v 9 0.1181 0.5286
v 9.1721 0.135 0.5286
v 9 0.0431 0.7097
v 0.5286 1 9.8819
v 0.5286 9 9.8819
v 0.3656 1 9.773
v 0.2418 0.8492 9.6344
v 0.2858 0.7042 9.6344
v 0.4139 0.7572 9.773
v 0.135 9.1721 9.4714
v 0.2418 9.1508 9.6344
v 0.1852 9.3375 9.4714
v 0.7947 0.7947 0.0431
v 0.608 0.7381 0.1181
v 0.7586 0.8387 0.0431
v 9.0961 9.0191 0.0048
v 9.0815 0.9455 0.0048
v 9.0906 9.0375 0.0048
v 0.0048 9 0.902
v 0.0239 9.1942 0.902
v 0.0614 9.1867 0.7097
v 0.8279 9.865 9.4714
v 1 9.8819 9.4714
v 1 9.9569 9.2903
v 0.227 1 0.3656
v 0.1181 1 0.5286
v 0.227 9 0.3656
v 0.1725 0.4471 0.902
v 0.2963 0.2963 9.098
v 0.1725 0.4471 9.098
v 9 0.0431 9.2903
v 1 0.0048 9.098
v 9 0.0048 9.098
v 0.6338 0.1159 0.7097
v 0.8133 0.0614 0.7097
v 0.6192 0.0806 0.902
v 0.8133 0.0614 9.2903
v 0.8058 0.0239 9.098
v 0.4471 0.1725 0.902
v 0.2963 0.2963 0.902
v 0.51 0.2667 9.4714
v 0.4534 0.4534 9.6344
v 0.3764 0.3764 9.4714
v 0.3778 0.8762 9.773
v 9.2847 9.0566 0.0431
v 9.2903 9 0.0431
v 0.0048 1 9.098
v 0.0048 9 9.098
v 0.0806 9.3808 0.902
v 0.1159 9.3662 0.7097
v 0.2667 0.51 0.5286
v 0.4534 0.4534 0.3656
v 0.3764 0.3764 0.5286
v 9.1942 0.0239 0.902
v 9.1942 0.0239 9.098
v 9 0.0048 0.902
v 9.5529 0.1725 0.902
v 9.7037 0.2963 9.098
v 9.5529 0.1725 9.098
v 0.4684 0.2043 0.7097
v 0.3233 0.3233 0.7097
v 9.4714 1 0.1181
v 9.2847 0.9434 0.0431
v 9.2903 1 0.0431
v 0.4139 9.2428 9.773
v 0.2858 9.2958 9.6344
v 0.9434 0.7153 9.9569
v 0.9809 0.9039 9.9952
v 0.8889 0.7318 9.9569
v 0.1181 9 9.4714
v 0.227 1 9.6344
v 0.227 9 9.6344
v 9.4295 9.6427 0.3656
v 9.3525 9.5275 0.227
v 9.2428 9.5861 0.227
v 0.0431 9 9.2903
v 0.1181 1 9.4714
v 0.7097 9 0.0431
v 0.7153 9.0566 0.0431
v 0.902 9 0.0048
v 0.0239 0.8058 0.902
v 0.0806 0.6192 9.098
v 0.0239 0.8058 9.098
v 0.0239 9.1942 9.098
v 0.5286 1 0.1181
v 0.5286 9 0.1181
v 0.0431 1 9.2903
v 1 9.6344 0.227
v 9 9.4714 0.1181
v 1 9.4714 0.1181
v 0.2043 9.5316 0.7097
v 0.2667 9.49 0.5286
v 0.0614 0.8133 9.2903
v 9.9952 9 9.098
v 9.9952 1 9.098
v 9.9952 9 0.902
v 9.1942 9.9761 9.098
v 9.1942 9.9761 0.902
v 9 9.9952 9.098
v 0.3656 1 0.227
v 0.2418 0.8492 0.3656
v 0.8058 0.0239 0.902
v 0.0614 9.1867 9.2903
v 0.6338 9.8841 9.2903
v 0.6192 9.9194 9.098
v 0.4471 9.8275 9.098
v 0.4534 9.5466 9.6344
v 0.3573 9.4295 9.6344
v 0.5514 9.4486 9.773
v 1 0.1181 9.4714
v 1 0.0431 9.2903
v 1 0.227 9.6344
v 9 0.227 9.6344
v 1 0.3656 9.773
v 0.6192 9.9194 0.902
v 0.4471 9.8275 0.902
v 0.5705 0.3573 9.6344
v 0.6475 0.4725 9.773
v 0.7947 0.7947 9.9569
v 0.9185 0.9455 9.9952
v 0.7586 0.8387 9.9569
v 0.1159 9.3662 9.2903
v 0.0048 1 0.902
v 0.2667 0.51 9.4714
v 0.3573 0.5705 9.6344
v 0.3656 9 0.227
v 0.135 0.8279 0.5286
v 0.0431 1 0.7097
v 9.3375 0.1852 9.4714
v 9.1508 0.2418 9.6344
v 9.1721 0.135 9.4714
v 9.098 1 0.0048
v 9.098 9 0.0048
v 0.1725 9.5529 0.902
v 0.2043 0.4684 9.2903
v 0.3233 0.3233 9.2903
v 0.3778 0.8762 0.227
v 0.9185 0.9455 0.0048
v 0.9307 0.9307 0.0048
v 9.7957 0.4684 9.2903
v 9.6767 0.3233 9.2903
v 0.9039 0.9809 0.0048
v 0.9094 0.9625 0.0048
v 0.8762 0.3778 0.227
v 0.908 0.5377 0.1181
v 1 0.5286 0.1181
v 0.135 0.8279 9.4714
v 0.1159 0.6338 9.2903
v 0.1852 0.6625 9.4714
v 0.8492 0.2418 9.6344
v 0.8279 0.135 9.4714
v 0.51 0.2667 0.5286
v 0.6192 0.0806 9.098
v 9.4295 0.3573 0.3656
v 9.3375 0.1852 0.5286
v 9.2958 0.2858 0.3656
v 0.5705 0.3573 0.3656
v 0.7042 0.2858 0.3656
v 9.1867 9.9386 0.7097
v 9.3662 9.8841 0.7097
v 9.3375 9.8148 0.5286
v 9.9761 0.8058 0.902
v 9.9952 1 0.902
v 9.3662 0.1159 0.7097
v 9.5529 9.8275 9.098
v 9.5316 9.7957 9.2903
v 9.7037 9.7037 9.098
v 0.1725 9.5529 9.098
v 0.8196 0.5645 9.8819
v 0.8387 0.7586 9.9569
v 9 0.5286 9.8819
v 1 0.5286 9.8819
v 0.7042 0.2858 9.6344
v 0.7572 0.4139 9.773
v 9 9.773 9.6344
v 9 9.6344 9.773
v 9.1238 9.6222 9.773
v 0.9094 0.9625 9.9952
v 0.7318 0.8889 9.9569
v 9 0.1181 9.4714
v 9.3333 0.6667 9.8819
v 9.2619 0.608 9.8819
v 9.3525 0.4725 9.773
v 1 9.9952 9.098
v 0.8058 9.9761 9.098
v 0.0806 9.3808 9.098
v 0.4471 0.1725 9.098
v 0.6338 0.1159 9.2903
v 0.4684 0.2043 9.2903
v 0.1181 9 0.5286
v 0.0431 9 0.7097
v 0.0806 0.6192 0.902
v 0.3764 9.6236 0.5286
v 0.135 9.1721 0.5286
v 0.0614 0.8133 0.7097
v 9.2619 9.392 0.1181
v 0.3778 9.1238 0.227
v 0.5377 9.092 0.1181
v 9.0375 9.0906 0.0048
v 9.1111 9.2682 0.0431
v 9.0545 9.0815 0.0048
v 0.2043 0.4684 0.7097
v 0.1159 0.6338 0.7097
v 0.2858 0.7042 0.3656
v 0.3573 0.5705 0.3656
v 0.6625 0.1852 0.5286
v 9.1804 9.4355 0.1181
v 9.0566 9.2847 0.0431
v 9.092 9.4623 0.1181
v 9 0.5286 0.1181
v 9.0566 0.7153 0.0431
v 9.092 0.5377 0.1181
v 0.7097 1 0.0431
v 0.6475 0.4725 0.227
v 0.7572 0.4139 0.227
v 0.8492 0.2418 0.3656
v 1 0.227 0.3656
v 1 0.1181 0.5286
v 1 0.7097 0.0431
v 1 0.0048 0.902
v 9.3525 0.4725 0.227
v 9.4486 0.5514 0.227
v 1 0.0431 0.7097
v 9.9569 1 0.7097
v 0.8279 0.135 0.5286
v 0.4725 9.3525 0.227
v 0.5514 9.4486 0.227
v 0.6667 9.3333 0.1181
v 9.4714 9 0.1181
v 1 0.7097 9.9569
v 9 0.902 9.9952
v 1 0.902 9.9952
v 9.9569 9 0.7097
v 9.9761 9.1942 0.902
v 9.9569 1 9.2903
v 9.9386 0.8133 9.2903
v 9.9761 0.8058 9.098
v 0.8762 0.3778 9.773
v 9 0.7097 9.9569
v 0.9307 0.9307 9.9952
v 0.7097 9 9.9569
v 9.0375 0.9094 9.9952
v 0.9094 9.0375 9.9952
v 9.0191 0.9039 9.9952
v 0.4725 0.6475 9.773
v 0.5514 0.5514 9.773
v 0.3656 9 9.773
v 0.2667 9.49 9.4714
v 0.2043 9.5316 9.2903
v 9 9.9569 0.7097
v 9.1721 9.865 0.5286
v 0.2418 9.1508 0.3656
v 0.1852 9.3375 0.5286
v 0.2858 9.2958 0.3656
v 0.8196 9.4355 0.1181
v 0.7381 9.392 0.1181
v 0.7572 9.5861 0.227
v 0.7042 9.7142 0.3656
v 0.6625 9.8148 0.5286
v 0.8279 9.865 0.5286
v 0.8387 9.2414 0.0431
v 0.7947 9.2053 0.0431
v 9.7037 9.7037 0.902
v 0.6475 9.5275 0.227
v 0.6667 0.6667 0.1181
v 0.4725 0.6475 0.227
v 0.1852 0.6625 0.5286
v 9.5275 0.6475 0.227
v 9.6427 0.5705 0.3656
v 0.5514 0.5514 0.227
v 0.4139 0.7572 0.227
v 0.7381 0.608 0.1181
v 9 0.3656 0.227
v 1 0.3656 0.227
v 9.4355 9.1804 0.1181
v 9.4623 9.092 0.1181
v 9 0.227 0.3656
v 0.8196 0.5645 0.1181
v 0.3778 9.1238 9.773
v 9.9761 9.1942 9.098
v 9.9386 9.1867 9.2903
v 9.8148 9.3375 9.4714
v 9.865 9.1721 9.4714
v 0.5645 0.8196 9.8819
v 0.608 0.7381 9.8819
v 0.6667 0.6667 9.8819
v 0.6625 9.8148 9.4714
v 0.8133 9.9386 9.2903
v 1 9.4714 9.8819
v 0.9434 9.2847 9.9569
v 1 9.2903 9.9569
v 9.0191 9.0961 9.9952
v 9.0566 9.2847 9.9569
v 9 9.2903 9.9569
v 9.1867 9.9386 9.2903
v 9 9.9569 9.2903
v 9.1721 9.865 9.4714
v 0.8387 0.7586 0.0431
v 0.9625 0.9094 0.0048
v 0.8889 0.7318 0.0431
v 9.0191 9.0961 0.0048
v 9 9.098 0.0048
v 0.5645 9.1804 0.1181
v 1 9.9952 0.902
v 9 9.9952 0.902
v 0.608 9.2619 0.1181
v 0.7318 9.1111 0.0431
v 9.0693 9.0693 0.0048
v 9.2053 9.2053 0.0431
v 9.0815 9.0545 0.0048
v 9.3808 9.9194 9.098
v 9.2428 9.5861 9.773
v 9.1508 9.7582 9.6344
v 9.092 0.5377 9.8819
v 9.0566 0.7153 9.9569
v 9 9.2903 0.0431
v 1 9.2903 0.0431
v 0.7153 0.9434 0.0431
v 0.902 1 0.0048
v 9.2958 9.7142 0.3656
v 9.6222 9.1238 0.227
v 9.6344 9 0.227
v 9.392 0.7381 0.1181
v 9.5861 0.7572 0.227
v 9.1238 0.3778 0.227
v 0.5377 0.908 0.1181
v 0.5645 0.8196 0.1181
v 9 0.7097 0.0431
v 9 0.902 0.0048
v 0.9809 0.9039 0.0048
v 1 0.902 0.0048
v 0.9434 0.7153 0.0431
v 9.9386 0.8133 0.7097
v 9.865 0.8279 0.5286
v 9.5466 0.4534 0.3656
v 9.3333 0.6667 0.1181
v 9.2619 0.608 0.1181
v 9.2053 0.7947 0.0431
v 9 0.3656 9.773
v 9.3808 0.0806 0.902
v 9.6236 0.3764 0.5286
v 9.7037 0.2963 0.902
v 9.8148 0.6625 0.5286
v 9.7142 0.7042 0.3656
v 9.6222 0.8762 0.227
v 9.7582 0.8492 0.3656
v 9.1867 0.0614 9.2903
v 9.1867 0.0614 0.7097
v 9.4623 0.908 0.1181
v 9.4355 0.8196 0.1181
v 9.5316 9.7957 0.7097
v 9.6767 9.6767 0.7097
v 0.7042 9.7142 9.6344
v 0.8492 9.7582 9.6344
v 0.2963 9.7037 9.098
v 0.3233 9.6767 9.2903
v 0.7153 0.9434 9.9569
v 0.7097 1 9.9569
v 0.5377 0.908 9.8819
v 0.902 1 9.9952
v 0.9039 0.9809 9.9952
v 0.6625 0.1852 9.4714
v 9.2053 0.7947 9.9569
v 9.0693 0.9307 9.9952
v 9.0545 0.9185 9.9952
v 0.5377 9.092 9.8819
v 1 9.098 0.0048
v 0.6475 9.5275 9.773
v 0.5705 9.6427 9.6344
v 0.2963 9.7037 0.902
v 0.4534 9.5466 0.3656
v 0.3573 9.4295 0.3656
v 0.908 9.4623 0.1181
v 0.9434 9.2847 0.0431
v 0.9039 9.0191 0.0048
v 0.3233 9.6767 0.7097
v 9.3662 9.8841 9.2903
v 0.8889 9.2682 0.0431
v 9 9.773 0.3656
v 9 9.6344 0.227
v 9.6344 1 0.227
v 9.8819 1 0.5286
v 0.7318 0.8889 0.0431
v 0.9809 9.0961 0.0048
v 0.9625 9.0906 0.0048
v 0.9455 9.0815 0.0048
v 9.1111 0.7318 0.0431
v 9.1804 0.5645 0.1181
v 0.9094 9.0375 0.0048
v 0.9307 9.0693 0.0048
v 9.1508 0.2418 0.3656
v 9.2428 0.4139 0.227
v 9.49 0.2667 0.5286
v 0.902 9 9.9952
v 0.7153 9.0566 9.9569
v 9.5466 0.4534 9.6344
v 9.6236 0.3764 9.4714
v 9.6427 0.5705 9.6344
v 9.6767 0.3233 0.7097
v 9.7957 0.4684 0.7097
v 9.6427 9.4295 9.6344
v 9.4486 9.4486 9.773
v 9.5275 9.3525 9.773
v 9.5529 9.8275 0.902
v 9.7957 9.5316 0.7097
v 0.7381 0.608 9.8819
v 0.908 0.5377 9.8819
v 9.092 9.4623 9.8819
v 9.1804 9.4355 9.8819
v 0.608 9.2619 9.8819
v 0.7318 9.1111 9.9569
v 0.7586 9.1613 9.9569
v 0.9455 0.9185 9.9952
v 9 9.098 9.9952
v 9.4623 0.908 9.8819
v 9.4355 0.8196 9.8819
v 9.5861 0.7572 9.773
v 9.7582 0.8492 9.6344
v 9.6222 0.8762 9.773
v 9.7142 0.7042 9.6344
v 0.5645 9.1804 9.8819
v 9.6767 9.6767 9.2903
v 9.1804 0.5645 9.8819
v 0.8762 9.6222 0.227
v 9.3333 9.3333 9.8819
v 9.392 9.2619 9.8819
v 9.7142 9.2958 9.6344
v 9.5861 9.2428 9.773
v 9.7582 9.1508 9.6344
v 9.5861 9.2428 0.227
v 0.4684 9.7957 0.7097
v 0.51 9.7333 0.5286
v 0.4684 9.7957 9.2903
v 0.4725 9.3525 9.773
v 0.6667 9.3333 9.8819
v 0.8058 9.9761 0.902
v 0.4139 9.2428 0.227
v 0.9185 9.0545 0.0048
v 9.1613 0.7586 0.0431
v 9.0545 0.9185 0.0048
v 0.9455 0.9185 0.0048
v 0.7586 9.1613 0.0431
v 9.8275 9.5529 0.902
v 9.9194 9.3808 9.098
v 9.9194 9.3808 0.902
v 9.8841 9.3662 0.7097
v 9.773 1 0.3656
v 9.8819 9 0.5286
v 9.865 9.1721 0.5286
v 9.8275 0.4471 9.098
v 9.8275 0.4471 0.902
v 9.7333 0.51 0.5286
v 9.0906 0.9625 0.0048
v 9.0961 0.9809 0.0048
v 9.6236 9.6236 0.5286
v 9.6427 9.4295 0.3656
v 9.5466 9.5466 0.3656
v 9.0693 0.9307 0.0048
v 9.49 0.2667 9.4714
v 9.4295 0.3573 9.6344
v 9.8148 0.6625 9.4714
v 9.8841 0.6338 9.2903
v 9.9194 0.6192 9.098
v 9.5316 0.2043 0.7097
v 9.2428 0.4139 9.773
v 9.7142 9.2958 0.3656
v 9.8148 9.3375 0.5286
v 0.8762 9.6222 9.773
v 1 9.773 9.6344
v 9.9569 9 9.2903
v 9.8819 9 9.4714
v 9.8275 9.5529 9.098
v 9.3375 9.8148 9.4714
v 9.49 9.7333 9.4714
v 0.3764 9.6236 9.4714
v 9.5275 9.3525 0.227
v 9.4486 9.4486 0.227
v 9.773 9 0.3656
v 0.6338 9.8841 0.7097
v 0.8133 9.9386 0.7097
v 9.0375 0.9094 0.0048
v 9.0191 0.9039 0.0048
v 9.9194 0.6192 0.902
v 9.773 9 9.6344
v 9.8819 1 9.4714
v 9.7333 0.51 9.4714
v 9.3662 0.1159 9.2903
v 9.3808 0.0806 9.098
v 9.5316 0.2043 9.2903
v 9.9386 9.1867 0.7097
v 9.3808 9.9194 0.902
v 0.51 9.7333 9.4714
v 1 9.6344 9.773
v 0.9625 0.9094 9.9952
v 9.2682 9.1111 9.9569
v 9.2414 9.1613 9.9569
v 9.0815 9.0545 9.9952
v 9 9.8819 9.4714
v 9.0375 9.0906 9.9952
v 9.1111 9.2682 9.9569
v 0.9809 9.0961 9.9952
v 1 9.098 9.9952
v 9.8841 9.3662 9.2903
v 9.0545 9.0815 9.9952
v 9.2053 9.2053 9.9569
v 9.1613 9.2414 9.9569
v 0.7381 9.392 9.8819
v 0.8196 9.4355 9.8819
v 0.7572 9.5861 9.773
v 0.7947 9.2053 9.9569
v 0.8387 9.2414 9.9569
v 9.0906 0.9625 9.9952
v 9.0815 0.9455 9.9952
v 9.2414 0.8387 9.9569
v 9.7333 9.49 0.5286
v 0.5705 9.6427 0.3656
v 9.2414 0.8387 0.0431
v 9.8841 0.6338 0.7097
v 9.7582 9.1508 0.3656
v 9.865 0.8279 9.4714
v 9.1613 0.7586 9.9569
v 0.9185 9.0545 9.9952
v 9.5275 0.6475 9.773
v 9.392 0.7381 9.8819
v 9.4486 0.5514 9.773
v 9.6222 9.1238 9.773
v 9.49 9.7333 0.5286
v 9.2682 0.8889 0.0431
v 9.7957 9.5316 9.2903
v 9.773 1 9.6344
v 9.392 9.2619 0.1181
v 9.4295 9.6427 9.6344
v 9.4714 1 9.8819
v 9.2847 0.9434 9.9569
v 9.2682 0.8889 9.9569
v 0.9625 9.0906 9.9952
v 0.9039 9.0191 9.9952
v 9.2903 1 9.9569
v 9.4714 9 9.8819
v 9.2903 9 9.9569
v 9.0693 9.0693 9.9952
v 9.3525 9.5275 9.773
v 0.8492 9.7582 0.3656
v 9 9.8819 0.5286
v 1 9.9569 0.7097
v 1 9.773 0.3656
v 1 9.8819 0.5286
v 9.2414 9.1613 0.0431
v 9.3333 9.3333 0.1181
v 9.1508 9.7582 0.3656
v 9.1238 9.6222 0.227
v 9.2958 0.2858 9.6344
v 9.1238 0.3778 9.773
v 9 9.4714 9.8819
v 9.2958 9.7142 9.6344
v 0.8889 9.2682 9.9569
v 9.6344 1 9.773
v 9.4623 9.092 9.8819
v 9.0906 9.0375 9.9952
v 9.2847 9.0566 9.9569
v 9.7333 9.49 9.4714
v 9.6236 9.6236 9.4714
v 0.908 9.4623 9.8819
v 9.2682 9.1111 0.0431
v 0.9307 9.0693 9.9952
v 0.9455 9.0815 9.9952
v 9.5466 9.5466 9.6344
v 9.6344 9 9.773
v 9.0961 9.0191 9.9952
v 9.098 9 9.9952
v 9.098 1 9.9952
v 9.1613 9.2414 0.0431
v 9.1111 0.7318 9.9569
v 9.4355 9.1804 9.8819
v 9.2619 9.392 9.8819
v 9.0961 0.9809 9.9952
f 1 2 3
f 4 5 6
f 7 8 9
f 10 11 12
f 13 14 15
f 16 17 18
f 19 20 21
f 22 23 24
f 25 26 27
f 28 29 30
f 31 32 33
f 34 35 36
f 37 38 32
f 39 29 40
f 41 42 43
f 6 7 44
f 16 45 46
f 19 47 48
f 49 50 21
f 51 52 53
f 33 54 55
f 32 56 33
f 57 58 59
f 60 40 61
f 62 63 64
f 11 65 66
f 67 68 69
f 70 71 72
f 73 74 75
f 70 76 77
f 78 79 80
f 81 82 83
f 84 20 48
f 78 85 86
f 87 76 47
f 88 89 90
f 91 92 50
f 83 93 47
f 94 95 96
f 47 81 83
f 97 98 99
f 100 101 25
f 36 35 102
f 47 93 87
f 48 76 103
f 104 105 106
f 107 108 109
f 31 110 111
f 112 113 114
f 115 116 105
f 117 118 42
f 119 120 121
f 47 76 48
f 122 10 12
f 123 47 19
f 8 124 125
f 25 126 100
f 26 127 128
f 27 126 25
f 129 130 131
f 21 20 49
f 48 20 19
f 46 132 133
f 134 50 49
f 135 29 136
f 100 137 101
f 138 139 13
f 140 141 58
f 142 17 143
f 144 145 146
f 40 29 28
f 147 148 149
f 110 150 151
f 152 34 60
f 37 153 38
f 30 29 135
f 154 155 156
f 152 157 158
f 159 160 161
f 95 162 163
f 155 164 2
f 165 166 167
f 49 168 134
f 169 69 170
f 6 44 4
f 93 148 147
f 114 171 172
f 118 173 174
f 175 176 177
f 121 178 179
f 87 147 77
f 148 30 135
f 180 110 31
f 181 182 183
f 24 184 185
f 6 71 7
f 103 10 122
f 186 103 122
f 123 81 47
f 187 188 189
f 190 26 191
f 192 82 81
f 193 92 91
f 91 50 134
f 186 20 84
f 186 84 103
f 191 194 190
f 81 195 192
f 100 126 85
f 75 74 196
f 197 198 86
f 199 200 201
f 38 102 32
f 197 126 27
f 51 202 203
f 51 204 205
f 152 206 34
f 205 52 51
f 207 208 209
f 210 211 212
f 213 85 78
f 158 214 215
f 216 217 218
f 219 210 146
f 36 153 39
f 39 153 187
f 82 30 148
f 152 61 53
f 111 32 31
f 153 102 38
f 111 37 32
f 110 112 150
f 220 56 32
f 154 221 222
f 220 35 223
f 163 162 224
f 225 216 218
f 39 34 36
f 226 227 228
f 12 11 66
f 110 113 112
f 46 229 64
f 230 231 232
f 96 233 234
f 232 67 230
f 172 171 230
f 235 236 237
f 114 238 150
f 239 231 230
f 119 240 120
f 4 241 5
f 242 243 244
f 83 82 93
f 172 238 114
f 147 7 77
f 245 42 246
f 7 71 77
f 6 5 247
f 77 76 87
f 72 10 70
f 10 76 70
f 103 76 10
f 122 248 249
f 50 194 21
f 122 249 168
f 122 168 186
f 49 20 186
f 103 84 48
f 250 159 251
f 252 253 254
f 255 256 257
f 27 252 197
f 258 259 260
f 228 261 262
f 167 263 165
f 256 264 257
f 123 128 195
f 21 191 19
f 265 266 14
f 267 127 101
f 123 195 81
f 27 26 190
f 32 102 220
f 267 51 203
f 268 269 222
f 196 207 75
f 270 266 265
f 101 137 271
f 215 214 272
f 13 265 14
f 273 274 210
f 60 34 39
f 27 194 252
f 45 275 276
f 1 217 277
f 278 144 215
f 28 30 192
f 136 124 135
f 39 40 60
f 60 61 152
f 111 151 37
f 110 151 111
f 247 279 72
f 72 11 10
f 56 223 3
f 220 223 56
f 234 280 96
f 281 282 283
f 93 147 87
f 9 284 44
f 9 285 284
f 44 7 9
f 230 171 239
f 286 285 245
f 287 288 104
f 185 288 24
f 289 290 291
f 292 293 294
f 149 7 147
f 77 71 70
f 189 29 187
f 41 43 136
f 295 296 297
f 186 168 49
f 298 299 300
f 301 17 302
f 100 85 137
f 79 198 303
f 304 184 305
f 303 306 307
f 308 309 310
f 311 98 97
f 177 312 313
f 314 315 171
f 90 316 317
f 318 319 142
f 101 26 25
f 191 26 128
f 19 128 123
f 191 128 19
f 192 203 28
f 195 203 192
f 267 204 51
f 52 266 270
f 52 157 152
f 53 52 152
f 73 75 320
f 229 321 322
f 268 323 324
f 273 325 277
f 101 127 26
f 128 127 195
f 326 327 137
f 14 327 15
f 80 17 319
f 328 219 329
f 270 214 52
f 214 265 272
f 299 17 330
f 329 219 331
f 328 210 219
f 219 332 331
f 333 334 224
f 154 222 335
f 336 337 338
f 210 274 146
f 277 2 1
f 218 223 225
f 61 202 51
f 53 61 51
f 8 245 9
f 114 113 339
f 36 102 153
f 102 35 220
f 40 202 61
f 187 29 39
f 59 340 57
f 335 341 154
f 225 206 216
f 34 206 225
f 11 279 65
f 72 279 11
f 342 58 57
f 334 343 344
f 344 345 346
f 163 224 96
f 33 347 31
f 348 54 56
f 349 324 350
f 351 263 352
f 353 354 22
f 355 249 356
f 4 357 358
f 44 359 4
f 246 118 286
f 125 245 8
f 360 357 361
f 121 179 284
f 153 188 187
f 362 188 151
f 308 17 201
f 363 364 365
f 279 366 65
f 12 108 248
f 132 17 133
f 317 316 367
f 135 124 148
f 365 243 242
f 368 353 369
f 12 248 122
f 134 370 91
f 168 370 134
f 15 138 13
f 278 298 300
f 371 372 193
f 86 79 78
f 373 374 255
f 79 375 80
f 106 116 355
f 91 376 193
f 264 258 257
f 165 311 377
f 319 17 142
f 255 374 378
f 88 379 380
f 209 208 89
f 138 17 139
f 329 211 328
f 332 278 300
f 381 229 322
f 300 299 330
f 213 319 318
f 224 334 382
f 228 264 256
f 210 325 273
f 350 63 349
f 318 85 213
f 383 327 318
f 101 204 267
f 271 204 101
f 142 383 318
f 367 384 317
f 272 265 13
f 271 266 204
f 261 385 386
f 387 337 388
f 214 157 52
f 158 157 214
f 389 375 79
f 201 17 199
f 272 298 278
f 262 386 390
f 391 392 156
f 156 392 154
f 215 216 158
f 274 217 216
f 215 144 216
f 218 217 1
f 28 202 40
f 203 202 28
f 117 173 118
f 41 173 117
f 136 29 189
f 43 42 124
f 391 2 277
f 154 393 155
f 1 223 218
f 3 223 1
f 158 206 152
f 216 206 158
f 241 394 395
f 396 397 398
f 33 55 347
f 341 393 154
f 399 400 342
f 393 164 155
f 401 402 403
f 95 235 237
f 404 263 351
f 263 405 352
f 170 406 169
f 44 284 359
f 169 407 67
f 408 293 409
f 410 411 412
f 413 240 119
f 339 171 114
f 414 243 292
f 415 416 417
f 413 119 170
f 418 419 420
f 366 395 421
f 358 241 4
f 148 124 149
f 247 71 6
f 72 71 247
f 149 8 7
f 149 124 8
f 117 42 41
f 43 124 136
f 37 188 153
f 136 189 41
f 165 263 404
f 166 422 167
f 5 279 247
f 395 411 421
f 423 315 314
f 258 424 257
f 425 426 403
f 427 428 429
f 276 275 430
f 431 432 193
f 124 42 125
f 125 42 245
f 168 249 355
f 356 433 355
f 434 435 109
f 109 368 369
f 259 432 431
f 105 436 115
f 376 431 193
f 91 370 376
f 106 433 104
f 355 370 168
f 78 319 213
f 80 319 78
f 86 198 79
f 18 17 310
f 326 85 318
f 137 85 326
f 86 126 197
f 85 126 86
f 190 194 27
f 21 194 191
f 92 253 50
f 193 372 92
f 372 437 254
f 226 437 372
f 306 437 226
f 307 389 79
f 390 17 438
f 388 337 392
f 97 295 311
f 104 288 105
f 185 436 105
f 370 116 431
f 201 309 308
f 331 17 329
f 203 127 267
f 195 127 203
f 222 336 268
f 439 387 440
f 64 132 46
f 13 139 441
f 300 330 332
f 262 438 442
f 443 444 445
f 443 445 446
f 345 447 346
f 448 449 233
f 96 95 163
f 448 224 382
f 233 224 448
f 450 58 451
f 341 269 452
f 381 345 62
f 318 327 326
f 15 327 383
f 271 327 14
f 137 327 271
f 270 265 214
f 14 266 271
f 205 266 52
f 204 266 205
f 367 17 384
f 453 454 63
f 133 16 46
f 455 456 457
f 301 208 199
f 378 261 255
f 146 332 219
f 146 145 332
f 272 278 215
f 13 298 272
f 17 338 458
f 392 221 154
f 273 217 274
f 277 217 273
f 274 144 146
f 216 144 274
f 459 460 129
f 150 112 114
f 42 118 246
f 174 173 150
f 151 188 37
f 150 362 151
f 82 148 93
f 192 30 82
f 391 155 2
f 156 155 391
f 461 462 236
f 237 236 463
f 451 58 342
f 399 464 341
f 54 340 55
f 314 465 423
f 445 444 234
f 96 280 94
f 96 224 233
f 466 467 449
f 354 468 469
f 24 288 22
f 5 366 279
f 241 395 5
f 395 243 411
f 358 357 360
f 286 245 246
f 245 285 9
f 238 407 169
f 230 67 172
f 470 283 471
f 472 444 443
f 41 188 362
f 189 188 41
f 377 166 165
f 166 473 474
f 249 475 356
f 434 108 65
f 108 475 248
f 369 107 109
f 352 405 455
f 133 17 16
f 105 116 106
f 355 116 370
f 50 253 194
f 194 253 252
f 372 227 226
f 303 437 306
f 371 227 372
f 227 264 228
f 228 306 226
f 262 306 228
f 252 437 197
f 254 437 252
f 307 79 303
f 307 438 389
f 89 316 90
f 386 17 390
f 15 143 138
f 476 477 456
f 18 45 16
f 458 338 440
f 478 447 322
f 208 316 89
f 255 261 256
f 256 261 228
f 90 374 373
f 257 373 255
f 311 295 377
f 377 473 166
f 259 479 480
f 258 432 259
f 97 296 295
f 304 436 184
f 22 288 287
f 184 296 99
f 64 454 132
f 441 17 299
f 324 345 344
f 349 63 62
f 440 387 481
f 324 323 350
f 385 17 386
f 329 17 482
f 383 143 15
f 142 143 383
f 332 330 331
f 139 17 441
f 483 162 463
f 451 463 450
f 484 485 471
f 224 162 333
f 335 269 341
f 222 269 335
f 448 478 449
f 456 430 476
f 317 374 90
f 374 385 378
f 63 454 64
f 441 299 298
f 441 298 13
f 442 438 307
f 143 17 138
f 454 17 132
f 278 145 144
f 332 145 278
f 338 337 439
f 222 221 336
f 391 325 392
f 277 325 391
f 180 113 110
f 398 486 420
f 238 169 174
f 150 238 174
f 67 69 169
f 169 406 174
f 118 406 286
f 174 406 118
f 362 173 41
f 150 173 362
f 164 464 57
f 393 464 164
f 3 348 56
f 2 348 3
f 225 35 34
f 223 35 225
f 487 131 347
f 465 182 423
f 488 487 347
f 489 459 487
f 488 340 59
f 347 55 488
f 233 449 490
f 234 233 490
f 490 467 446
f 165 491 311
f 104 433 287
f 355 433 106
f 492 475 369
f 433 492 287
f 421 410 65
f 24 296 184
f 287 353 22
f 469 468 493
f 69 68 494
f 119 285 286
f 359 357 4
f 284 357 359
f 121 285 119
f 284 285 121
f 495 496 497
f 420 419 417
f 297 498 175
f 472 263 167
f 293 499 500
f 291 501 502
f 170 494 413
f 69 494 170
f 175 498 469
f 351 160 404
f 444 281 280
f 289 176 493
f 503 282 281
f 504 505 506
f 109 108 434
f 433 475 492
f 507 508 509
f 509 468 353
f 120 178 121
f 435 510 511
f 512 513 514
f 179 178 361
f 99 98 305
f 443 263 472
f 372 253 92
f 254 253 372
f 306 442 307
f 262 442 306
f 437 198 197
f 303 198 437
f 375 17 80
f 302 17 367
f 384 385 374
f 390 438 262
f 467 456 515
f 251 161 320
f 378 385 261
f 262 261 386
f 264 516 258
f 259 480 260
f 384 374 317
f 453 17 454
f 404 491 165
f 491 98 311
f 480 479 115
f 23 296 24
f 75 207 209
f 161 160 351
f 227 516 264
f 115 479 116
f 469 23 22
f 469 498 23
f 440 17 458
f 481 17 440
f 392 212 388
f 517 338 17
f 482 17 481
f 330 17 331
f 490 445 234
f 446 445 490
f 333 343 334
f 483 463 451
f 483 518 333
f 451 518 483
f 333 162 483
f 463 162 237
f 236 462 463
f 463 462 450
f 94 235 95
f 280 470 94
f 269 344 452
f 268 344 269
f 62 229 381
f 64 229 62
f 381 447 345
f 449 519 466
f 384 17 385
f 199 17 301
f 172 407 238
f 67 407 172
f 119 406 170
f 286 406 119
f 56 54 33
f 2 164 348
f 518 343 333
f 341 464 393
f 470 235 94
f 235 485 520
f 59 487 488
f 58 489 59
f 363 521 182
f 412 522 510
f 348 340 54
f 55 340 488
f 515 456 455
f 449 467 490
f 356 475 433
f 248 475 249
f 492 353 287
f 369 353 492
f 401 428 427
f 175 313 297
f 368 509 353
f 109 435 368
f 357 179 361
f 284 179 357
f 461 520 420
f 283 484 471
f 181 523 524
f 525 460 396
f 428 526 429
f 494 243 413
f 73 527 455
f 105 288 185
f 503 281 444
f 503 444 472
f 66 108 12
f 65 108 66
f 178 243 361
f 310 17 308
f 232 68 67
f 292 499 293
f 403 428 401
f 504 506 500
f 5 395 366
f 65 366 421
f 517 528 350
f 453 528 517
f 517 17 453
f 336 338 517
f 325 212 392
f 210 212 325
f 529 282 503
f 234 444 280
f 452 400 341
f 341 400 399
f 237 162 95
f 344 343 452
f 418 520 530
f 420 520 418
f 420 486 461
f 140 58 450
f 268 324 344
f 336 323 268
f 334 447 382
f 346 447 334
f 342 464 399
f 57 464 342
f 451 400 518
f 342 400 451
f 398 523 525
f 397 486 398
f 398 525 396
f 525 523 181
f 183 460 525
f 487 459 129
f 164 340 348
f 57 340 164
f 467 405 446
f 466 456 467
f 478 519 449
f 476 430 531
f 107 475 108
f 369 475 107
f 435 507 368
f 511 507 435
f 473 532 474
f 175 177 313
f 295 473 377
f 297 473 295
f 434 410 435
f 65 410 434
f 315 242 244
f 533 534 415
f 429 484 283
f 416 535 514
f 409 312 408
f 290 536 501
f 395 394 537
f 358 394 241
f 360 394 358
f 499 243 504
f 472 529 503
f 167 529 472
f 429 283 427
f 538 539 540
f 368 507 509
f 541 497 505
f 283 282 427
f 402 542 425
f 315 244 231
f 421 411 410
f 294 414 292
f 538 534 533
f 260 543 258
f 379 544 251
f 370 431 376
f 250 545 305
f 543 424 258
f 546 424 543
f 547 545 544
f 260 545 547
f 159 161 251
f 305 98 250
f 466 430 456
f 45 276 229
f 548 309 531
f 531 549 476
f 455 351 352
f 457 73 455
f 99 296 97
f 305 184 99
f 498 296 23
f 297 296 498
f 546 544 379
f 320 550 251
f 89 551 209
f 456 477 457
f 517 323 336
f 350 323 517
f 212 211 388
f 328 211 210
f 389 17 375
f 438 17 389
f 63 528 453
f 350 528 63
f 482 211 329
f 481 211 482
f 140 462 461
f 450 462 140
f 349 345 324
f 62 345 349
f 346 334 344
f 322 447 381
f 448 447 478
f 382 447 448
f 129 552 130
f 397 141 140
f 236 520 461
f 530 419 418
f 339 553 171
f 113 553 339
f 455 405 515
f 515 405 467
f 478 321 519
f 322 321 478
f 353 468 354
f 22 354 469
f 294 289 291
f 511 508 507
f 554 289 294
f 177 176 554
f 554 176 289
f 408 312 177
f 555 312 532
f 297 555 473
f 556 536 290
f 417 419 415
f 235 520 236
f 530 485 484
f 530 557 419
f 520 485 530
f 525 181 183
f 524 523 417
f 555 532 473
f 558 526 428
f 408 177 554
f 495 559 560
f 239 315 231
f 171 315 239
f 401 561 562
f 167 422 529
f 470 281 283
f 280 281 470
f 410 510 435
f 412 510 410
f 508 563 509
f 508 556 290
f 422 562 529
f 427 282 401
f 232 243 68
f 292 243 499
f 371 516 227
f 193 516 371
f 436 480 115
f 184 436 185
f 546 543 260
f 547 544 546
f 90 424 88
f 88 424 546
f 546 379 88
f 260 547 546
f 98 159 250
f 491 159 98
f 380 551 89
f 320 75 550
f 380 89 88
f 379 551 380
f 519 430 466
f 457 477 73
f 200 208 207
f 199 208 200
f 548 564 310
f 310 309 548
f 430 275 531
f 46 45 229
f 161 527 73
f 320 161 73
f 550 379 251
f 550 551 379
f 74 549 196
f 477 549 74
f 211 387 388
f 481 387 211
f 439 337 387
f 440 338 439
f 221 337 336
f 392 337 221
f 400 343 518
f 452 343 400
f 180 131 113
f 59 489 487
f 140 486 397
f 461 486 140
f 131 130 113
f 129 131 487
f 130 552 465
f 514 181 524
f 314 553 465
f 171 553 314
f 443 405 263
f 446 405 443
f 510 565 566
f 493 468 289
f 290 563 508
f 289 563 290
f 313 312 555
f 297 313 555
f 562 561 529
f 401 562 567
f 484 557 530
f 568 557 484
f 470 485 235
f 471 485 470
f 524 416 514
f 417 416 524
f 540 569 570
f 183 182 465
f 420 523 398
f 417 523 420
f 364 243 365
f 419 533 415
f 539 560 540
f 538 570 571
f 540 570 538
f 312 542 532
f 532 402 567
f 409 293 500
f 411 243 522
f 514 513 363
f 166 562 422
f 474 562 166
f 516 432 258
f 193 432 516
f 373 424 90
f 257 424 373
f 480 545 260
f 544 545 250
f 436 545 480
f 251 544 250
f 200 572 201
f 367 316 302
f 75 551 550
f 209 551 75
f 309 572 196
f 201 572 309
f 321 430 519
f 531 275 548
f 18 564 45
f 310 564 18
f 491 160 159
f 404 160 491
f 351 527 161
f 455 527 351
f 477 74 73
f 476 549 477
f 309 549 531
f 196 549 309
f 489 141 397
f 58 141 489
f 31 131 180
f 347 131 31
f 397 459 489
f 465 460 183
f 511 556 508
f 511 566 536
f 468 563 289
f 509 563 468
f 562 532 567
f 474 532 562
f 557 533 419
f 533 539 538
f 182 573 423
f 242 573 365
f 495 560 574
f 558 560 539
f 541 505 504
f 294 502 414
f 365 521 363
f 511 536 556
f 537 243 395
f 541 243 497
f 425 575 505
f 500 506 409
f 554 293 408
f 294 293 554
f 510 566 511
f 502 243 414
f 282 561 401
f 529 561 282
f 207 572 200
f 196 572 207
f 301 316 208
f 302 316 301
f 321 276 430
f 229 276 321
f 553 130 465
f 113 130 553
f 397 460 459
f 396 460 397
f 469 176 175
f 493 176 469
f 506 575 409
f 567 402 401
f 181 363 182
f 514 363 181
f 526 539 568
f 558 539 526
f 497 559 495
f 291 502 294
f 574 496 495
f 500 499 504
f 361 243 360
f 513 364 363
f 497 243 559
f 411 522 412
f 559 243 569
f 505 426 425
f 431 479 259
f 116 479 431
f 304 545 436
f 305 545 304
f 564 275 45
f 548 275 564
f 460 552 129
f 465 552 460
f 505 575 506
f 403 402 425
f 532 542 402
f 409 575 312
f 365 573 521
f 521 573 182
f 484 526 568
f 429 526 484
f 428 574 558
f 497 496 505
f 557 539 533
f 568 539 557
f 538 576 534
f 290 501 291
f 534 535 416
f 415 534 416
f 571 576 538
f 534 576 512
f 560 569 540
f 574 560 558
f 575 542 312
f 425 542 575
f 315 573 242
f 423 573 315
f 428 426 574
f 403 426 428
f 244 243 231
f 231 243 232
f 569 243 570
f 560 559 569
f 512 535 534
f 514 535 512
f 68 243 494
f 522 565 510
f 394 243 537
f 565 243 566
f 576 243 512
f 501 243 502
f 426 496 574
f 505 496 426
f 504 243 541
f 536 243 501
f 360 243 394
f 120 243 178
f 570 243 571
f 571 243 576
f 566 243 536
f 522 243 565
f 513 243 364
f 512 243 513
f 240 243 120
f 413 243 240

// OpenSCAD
//Rounded cube module - faster than minkowski!
//variables with "customizer" in them are only for the Thingiverse customizer and are not essential.


customizer_x=10;
customizer_y=10;
customizer_z=10;

customizer_facets=32;
customizer_rounding_radius=1;

module rounded_cube(size_x,size_y,size_z,facets,rounding_radius)
{
	hull()
	{
		translate([rounding_radius,rounding_radius,rounding_radius]) sphere (r=rounding_radius,$fn=facets);
		translate([size_x-rounding_radius,rounding_radius,rounding_radius]) sphere (r=rounding_radius,$fn=facets);
		translate([rounding_radius,size_y-rounding_radius,rounding_radius]) sphere (r=rounding_radius,$fn=facets);
		translate([size_x-rounding_radius,size_y-rounding_radius,rounding_radius]) sphere (r=rounding_radius,$fn=facets);

		translate([rounding_radius,rounding_radius,size_z-rounding_radius]) sphere (r=rounding_radius,$fn=facets);
		translate([size_x-rounding_radius,rounding_radius,size_z-rounding_radius]) sphere (r=rounding_radius,$fn=facets);
		translate([rounding_radius,size_y-rounding_radius,size_z-rounding_radius]) sphere (r=rounding_radius,$fn=facets);
		translate([size_x-rounding_radius,size_y-rounding_radius,size_z-rounding_radius]) sphere (r=rounding_radius,$fn=facets);
	}
}

rounded_cube(customizer_x,customizer_y,customizer_z,customizer_facets,customizer_rounding_radius);
